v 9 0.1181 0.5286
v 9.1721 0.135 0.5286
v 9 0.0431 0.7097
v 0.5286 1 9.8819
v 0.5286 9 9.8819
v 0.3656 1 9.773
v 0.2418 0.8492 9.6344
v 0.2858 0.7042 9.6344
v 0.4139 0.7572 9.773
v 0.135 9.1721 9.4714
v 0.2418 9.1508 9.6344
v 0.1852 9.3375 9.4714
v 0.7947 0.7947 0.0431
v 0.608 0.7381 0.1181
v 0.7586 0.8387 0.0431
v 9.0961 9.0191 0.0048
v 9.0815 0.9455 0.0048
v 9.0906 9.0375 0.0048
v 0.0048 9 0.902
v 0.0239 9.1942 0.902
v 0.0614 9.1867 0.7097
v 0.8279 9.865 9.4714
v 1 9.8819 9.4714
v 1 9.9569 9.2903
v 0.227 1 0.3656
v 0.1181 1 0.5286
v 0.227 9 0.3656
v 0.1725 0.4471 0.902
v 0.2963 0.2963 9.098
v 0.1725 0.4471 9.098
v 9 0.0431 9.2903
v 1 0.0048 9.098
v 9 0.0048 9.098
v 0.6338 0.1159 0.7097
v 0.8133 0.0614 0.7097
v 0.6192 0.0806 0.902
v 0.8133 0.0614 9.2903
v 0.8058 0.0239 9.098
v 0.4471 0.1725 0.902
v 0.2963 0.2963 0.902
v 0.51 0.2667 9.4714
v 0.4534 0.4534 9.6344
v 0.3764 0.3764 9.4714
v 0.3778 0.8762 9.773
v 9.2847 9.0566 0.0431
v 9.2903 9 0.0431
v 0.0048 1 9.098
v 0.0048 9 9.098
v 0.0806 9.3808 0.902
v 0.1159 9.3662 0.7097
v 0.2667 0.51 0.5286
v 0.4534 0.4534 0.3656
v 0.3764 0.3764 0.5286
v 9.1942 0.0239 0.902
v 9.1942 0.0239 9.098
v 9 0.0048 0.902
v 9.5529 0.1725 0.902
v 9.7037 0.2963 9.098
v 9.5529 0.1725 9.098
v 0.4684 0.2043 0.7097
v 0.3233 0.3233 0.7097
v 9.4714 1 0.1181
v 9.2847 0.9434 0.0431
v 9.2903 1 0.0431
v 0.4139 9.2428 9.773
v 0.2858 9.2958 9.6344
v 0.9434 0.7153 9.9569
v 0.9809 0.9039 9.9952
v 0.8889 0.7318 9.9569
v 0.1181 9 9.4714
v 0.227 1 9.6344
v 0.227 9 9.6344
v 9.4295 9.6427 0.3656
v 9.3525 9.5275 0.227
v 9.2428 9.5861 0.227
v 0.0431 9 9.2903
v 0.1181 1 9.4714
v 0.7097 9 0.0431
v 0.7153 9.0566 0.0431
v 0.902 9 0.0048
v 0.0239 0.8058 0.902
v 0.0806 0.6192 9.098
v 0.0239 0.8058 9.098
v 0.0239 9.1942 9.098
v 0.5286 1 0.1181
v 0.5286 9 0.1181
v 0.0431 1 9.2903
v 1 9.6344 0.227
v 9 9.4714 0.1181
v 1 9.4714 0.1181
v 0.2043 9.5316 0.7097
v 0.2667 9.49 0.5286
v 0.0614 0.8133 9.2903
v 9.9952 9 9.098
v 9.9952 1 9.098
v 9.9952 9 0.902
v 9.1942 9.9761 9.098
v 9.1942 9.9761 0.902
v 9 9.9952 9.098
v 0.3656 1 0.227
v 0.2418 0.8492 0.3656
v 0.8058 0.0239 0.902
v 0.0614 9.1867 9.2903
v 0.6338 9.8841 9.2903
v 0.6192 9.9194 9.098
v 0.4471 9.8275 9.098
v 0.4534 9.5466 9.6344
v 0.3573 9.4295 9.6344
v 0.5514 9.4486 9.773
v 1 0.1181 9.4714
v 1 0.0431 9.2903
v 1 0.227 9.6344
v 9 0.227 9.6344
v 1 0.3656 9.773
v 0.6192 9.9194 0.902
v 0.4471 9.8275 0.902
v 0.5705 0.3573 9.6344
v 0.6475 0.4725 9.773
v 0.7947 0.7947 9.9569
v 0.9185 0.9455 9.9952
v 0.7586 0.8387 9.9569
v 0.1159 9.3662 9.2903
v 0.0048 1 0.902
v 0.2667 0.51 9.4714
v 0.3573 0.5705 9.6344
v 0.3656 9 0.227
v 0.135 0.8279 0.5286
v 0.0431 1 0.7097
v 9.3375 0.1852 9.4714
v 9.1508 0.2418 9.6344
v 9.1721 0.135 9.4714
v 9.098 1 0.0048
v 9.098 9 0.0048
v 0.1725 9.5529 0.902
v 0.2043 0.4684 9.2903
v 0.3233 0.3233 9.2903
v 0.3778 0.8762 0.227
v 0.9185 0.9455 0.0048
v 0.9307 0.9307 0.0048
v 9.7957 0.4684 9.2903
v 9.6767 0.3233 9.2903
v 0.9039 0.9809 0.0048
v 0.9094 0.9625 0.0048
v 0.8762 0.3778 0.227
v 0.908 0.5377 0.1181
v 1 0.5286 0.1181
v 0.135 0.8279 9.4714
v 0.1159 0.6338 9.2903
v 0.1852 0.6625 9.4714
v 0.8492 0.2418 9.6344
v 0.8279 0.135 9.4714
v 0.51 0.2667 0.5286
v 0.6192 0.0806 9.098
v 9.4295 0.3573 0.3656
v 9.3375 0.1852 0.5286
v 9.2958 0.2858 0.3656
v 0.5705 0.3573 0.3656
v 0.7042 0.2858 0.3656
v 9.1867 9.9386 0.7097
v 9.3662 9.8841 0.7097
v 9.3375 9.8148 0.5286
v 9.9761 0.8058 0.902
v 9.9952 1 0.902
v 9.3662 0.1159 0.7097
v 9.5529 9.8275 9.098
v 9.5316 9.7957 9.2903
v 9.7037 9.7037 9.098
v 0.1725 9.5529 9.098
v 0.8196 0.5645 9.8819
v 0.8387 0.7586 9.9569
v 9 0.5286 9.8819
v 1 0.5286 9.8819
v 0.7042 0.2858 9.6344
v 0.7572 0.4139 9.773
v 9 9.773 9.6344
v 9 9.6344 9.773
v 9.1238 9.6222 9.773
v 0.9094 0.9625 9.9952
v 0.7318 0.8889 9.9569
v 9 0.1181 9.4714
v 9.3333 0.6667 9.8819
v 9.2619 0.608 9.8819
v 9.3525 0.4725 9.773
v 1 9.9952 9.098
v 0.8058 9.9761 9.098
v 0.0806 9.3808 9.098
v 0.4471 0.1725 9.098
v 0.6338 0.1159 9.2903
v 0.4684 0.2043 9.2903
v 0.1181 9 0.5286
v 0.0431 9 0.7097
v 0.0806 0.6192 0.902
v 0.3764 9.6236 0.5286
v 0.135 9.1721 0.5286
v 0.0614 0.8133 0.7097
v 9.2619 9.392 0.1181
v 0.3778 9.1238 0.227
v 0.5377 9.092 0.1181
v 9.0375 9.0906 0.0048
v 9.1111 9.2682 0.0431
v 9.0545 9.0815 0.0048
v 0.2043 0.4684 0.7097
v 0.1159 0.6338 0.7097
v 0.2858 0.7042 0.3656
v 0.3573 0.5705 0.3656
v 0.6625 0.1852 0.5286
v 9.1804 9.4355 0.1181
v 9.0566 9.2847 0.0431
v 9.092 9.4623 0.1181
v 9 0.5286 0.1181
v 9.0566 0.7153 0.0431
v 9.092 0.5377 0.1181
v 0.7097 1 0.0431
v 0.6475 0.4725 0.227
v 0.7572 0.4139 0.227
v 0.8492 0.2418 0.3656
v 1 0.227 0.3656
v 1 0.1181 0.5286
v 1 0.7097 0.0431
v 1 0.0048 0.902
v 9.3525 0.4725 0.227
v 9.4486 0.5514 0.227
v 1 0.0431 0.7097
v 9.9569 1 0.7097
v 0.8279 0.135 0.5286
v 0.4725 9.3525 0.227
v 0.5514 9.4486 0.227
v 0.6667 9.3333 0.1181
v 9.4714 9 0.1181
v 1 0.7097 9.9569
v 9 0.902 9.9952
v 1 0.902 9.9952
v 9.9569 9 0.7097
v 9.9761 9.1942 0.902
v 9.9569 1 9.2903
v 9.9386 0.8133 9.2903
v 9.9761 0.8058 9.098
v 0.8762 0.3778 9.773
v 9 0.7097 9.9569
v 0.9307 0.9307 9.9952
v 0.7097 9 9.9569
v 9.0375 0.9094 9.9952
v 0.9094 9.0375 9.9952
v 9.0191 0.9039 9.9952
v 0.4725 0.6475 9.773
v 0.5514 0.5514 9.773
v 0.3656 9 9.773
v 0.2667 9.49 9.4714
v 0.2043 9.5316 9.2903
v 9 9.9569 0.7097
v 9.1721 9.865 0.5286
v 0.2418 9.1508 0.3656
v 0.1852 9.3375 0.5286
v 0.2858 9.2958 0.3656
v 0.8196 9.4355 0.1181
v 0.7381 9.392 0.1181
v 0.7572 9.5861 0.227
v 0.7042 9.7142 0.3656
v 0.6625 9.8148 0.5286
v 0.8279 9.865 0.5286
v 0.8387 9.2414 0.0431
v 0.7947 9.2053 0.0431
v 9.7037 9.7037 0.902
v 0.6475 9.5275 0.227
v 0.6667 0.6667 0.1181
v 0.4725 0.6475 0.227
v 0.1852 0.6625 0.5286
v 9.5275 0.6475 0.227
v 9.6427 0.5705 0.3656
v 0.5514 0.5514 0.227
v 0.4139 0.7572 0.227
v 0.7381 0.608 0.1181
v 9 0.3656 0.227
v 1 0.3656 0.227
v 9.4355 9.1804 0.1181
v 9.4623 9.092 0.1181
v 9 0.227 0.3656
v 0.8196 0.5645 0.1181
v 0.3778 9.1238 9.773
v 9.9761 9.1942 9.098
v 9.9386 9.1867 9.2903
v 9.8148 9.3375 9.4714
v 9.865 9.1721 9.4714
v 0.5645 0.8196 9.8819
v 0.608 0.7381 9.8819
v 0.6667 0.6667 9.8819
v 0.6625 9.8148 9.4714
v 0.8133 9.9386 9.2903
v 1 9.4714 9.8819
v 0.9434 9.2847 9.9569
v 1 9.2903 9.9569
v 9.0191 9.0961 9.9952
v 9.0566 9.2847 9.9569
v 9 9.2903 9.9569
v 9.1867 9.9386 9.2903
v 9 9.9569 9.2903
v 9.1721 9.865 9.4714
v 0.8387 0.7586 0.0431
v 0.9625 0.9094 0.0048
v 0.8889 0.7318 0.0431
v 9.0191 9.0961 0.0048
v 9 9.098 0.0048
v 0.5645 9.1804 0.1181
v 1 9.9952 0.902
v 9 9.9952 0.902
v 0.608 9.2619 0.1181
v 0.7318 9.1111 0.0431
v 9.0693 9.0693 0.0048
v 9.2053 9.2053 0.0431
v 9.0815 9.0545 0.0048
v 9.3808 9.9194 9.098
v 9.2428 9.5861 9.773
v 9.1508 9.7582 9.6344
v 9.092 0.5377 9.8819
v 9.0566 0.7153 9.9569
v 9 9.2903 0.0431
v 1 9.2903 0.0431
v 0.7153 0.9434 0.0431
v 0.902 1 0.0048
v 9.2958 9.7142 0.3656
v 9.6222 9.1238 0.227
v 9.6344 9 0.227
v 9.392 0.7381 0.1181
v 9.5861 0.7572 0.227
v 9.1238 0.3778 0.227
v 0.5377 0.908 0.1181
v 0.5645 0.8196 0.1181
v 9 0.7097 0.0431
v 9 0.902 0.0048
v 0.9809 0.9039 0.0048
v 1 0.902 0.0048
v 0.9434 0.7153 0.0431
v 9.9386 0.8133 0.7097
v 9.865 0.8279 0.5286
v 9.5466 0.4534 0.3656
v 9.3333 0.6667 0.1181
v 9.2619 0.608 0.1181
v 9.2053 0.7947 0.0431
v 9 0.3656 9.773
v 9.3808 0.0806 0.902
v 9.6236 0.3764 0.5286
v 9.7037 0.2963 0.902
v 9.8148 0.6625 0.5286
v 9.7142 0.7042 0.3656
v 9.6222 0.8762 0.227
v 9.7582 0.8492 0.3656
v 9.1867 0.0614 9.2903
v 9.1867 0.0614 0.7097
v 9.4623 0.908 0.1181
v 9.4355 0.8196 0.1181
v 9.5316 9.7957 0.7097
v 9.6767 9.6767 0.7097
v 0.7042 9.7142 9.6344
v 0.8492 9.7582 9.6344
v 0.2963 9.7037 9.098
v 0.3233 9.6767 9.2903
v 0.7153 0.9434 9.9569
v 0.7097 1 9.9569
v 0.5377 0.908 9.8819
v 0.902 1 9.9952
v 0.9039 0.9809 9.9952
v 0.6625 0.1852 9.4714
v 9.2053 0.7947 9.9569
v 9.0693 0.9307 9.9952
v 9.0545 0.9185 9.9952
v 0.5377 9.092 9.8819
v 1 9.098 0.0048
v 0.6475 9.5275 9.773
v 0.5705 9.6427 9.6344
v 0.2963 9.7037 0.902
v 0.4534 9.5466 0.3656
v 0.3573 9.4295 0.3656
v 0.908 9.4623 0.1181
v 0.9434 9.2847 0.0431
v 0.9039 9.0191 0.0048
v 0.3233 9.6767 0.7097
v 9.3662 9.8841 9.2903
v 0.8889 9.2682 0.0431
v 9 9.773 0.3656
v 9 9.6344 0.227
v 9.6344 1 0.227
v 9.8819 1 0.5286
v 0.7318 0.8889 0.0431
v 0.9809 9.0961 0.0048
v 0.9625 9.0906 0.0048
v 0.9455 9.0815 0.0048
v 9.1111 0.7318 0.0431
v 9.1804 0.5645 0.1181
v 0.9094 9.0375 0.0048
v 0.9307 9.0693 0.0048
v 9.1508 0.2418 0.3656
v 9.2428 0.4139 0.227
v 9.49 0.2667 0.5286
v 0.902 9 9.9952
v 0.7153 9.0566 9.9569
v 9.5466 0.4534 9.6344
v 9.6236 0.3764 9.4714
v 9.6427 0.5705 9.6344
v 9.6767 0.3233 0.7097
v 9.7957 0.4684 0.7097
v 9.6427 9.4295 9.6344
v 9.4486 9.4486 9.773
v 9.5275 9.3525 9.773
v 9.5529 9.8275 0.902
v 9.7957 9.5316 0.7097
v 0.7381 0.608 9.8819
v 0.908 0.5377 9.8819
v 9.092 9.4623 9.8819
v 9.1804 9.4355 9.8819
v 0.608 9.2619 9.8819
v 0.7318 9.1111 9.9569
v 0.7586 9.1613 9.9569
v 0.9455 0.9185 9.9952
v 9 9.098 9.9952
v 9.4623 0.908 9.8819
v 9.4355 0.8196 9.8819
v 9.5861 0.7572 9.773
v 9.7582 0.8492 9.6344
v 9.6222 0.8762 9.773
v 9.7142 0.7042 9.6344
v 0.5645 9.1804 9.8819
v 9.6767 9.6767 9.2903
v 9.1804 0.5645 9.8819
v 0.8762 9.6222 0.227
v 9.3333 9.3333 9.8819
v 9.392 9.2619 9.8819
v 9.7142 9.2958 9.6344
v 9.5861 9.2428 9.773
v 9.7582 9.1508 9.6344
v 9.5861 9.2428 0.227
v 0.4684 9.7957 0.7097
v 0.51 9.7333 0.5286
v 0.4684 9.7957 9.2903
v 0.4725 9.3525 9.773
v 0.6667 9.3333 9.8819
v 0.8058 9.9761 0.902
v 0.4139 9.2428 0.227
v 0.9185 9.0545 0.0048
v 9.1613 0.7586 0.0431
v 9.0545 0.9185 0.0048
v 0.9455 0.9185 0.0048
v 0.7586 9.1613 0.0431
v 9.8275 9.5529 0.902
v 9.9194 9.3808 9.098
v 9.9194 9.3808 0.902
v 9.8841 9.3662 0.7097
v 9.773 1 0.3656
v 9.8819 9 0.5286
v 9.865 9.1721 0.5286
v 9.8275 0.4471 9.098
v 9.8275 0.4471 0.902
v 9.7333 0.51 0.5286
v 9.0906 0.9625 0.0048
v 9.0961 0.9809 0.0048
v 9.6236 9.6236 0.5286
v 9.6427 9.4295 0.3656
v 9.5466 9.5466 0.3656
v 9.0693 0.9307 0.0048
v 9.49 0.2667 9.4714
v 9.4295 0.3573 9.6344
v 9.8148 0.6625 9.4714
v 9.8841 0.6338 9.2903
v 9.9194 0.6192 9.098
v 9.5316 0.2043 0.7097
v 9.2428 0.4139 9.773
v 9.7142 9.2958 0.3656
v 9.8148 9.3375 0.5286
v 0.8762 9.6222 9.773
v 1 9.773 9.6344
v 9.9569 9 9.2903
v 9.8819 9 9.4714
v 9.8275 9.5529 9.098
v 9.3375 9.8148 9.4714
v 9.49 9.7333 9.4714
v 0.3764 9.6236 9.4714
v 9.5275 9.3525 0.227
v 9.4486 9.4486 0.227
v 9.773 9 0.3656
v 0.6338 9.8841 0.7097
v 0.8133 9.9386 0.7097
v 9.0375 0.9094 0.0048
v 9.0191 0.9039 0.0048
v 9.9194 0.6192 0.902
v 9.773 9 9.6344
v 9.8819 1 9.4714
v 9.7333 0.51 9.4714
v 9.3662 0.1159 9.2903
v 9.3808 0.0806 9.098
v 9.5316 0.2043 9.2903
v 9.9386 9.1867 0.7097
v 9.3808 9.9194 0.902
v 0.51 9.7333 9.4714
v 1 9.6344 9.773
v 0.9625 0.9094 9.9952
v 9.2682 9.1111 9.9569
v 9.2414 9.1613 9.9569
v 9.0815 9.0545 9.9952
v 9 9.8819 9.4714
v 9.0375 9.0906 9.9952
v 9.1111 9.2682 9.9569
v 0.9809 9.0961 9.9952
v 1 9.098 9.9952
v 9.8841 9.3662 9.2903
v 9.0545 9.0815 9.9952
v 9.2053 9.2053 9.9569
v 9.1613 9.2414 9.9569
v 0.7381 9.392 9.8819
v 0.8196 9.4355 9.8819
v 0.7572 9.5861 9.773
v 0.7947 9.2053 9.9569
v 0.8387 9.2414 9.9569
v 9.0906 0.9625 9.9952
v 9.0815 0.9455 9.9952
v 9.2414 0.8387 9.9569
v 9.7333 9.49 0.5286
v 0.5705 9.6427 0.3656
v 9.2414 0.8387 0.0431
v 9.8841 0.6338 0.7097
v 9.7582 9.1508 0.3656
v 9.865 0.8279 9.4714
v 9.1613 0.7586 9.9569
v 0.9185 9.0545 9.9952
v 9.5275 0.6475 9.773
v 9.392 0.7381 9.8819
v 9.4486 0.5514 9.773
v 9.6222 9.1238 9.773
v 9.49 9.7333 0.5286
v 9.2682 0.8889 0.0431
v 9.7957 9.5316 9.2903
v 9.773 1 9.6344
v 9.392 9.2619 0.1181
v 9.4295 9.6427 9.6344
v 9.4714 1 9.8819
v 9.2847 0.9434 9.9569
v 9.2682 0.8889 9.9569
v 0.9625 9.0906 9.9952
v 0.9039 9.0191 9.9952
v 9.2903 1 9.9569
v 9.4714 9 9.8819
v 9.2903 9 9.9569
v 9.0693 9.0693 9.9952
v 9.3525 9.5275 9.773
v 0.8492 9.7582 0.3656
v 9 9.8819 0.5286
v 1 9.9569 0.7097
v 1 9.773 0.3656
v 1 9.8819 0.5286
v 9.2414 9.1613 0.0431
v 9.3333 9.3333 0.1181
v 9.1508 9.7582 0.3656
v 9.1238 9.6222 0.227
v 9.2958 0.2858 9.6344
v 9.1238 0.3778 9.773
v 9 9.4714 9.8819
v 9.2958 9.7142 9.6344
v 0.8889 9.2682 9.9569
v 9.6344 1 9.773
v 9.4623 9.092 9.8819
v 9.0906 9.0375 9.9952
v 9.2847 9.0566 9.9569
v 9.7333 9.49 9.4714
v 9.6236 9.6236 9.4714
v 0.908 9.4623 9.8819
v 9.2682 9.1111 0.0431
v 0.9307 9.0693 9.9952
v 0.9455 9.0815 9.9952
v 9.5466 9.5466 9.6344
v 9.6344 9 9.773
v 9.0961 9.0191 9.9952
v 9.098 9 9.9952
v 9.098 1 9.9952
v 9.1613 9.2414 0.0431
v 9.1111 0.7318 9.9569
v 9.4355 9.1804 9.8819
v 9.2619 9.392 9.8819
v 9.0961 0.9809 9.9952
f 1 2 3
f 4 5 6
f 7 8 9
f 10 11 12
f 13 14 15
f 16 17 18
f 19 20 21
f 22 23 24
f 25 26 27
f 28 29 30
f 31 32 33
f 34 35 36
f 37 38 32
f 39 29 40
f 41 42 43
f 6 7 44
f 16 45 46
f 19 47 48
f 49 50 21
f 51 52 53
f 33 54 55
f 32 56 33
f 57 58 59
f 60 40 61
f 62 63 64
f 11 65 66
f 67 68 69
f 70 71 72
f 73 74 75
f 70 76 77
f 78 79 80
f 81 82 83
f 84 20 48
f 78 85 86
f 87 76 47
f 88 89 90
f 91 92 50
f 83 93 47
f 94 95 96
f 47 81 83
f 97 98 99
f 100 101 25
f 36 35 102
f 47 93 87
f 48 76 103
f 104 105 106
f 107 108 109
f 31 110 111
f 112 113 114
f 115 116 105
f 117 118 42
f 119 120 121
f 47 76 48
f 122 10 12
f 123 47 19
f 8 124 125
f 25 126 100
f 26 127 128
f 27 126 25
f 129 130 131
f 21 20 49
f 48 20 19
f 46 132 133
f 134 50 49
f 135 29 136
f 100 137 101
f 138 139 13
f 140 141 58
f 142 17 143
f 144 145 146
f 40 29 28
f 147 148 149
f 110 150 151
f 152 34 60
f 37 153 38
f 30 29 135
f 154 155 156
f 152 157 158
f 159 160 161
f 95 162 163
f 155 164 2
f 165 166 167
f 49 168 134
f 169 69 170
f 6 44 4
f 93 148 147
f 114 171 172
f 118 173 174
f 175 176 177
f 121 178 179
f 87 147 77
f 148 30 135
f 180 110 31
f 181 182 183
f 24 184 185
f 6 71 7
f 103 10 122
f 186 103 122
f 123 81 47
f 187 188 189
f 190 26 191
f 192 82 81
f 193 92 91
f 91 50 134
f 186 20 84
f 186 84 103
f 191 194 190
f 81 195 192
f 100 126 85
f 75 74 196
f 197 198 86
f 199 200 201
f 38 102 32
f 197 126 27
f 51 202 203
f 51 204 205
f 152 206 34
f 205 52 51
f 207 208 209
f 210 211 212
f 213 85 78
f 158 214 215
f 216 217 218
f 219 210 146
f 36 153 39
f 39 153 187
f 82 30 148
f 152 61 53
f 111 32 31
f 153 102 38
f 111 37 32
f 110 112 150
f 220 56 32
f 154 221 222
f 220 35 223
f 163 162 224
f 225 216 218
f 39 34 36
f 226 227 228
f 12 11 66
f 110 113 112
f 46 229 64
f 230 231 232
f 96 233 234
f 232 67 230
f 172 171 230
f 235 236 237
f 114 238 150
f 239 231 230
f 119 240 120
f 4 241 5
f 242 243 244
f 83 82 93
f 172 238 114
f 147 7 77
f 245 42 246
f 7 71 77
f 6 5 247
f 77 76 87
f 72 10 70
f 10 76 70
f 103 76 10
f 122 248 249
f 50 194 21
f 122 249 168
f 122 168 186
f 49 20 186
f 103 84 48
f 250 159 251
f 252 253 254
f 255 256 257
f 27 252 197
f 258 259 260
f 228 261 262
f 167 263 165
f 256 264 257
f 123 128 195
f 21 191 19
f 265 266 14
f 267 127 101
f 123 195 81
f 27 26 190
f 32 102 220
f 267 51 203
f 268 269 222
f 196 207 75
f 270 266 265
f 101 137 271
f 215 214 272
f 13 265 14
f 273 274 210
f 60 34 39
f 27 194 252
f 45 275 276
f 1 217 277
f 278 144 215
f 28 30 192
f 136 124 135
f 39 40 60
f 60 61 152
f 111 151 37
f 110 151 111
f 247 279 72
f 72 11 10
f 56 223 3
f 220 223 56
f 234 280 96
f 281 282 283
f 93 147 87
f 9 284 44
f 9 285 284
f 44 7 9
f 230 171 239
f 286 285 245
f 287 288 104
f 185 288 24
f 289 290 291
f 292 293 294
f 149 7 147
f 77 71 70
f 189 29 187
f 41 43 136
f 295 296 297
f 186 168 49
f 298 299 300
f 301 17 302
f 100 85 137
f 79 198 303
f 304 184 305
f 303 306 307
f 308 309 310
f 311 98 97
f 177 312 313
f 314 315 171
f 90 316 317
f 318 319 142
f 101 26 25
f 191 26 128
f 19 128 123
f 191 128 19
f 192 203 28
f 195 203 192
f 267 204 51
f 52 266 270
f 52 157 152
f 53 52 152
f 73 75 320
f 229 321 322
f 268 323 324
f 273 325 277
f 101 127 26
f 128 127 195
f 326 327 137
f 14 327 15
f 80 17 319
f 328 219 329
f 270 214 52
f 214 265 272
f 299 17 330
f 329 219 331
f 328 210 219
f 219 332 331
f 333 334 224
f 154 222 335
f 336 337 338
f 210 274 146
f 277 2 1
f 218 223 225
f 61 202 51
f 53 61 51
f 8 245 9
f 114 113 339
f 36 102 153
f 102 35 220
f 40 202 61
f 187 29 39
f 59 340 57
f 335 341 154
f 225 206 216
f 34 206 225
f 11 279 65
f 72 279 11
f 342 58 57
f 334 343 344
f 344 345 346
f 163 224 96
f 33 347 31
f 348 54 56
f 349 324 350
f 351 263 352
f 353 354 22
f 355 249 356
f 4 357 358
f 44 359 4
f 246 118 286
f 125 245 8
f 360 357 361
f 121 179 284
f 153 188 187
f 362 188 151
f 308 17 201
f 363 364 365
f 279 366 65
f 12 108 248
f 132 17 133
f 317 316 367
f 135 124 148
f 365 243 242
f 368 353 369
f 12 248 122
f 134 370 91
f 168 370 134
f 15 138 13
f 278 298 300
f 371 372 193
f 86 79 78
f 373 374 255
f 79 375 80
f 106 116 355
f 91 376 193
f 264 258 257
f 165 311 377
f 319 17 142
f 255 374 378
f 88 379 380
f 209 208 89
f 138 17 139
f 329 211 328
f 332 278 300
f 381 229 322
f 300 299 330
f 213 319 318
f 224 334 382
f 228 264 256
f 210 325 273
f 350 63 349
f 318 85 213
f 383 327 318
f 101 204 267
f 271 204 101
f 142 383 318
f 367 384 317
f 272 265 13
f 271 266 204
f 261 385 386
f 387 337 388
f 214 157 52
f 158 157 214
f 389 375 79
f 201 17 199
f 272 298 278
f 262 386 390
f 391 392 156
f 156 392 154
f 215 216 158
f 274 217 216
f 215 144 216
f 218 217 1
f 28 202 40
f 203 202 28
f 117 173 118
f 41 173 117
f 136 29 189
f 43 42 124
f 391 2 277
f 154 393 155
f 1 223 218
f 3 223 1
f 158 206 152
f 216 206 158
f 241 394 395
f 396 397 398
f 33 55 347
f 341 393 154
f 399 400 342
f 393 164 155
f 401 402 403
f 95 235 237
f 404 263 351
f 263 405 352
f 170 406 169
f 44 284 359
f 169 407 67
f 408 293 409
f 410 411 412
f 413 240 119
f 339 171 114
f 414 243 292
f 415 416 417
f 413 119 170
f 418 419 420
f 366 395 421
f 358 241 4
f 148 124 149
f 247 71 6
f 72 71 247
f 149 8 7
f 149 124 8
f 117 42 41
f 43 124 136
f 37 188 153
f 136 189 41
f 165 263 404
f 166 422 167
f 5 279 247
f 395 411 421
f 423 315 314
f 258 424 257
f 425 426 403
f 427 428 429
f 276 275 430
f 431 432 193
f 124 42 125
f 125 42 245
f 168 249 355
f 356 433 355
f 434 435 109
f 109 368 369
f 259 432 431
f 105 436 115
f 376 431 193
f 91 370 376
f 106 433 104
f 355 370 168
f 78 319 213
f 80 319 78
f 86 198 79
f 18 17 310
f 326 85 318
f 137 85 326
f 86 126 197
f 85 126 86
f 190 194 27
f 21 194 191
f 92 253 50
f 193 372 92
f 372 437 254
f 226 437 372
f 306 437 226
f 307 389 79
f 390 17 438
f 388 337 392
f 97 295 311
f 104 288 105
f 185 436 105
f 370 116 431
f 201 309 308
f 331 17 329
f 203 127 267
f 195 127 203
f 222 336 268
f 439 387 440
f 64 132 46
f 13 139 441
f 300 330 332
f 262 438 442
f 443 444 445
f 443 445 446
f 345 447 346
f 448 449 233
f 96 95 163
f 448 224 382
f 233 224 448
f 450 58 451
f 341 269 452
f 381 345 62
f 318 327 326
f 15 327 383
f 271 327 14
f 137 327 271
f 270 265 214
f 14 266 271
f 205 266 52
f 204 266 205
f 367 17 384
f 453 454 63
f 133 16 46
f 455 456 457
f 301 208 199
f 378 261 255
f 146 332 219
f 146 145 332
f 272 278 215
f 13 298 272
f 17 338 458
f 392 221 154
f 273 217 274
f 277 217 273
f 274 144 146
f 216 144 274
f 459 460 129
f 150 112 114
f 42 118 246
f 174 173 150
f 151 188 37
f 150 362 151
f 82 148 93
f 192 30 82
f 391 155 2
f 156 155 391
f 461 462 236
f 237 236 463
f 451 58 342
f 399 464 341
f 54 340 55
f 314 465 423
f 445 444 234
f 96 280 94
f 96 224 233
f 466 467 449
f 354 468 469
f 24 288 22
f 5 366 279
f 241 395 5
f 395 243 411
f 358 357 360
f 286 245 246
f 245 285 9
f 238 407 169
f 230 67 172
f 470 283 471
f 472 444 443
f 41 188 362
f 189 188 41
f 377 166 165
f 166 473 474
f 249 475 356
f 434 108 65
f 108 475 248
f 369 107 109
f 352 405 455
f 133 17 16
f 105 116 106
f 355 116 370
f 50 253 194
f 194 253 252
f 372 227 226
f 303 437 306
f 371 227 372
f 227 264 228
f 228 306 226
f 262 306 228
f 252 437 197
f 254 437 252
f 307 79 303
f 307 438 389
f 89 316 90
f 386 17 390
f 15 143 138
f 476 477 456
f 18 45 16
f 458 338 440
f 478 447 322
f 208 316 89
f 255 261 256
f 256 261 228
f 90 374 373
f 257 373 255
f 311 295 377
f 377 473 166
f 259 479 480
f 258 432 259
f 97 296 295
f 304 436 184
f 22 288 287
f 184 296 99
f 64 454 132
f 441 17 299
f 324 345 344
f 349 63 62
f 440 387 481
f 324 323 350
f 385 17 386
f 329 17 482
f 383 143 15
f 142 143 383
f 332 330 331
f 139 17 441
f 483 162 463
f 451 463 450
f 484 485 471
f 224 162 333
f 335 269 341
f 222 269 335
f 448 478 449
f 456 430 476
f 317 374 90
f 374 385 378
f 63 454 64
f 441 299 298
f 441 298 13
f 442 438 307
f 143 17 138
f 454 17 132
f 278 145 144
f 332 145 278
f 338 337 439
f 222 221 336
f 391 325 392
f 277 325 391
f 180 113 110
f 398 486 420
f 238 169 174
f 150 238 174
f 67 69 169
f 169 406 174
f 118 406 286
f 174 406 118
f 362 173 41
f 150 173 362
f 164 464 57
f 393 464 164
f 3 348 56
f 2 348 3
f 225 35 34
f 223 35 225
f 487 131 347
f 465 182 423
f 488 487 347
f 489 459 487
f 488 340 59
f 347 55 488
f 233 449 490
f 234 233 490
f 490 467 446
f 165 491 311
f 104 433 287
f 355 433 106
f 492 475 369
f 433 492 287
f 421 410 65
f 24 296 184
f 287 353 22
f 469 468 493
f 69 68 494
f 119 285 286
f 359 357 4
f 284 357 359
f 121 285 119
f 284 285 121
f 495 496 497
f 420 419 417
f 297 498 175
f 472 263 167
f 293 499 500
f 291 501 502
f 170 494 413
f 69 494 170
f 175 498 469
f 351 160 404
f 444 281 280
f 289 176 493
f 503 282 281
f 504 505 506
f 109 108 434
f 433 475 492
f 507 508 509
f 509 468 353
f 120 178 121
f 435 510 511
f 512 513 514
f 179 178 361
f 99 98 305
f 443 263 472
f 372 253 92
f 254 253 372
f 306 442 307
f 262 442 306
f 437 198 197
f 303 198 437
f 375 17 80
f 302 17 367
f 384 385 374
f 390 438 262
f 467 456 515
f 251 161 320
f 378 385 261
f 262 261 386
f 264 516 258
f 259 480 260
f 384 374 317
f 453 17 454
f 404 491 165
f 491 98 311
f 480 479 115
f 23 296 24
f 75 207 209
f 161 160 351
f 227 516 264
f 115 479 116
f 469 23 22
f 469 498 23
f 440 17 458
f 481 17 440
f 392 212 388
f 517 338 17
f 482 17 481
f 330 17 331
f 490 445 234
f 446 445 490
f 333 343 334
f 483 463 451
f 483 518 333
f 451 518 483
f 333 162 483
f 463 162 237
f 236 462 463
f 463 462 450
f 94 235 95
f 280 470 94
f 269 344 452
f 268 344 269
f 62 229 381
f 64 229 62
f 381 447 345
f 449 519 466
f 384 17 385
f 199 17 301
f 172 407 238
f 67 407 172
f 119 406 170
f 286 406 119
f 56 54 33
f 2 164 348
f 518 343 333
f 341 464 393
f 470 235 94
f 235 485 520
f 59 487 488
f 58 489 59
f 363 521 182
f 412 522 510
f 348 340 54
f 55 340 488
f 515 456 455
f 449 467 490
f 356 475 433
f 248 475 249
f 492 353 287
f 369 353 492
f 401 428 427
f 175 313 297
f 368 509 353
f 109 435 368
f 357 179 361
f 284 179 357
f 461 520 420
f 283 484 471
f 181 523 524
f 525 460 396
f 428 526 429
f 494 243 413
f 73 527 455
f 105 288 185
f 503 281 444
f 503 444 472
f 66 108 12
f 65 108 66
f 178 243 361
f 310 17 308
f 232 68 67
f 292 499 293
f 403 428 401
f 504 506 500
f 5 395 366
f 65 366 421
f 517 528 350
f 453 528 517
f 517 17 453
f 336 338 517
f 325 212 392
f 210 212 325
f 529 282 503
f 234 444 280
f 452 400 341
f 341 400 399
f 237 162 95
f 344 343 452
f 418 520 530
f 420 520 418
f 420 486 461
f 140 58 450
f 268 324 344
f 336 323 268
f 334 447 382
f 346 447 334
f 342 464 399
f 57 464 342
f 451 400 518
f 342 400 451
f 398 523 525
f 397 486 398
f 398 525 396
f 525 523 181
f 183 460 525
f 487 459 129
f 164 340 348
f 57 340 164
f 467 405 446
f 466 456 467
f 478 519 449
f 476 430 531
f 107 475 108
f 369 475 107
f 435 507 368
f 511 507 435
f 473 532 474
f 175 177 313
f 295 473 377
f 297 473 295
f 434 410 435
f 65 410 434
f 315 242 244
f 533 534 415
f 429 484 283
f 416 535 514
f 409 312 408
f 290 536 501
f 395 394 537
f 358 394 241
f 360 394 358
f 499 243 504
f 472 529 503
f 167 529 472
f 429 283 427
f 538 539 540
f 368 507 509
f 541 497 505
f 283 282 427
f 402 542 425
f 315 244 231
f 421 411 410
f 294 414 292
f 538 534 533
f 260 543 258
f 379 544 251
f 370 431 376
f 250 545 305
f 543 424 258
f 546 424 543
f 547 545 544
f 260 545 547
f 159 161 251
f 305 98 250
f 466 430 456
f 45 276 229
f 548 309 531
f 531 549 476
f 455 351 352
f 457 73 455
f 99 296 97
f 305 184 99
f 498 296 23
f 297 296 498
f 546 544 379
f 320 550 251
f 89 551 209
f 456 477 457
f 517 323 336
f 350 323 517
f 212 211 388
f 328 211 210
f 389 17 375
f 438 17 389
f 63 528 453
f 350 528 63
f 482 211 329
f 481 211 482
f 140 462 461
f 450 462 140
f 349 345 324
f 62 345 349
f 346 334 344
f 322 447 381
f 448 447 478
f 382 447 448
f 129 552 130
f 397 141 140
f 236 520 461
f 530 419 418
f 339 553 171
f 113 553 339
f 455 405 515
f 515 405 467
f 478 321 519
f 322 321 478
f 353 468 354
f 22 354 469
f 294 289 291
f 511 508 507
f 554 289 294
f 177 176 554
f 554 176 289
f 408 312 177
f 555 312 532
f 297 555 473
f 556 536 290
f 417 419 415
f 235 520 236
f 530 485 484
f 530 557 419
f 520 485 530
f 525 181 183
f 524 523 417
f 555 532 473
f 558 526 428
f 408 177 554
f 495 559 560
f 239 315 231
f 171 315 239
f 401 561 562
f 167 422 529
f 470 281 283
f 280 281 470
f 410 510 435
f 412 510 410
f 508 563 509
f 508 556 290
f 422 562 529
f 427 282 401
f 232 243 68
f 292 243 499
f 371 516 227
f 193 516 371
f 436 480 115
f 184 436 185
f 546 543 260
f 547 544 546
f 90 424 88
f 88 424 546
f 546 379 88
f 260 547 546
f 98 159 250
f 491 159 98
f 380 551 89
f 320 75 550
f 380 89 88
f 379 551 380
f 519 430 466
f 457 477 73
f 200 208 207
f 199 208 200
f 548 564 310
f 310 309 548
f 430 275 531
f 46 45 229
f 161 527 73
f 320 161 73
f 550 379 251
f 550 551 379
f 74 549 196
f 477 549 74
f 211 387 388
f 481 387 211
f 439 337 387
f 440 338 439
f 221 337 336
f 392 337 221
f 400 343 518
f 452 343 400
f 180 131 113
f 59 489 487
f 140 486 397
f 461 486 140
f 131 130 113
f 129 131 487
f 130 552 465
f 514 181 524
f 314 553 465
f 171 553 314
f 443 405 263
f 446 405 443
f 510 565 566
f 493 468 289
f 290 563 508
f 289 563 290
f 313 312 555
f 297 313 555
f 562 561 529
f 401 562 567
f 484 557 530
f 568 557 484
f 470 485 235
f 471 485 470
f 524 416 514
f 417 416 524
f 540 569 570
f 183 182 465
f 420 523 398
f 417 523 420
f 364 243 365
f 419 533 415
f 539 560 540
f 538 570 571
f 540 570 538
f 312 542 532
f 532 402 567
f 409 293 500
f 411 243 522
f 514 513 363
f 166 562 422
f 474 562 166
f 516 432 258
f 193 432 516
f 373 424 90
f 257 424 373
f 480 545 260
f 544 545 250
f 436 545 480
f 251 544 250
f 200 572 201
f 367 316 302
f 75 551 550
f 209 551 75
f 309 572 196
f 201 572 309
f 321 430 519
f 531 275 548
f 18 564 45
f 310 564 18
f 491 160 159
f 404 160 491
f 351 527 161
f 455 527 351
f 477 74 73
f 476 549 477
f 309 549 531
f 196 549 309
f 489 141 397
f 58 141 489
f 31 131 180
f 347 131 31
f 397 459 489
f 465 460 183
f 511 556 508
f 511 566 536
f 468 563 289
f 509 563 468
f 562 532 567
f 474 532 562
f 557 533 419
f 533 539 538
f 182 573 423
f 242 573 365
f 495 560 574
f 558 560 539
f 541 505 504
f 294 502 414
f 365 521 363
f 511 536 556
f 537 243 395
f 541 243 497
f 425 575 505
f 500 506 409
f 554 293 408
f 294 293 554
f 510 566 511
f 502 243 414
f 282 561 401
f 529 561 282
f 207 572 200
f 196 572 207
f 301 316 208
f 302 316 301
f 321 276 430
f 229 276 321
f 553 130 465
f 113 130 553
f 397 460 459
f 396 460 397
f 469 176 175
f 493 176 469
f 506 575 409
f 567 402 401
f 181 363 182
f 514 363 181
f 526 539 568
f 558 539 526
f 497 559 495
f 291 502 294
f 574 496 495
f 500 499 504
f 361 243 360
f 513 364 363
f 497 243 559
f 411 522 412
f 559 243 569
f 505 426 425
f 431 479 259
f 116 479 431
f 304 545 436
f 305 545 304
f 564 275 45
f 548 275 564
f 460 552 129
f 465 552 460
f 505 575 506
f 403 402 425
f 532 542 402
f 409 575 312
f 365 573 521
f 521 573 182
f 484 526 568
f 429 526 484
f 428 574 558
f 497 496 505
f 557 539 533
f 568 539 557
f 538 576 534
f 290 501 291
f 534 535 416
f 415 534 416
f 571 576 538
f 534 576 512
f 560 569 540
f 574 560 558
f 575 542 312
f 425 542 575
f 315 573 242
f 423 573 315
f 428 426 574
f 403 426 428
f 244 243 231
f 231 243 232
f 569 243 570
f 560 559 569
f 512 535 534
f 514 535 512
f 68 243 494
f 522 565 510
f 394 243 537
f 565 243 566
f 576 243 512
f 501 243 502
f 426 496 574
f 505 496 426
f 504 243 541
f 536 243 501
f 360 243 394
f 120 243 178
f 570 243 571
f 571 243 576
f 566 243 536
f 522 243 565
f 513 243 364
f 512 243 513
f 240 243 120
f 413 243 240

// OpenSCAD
//Rounded cube module - faster than minkowski!
//variables with "customizer" in them are only for the Thingiverse customizer and are not essential.


customizer_x=10;
customizer_y=10;
customizer_z=10;

customizer_facets=32;
customizer_rounding_radius=1;

module rounded_cube(size_x,size_y,size_z,facets,rounding_radius)
{
	hull()
	{
		translate([rounding_radius,rounding_radius,rounding_radius]) sphere (r=rounding_radius,$fn=facets);
		translate([size_x-rounding_radius,rounding_radius,rounding_radius]) sphere (r=rounding_radius,$fn=facets);
		translate([rounding_radius,size_y-rounding_radius,rounding_radius]) sphere (r=rounding_radius,$fn=facets);
		translate([size_x-rounding_radius,size_y-rounding_radius,rounding_radius]) sphere (r=rounding_radius,$fn=facets);

		translate([rounding_radius,rounding_radius,size_z-rounding_radius]) sphere (r=rounding_radius,$fn=facets);
		translate([size_x-rounding_radius,rounding_radius,size_z-rounding_radius]) sphere (r=rounding_radius,$fn=facets);
		translate([rounding_radius,size_y-rounding_radius,size_z-rounding_radius]) sphere (r=rounding_radius,$fn=facets);
		translate([size_x-rounding_radius,size_y-rounding_radius,size_z-rounding_radius]) sphere (r=rounding_radius,$fn=facets);
	}
}

rounded_cube(customizer_x,customizer_y,customizer_z,customizer_facets,customizer_rounding_radius);
